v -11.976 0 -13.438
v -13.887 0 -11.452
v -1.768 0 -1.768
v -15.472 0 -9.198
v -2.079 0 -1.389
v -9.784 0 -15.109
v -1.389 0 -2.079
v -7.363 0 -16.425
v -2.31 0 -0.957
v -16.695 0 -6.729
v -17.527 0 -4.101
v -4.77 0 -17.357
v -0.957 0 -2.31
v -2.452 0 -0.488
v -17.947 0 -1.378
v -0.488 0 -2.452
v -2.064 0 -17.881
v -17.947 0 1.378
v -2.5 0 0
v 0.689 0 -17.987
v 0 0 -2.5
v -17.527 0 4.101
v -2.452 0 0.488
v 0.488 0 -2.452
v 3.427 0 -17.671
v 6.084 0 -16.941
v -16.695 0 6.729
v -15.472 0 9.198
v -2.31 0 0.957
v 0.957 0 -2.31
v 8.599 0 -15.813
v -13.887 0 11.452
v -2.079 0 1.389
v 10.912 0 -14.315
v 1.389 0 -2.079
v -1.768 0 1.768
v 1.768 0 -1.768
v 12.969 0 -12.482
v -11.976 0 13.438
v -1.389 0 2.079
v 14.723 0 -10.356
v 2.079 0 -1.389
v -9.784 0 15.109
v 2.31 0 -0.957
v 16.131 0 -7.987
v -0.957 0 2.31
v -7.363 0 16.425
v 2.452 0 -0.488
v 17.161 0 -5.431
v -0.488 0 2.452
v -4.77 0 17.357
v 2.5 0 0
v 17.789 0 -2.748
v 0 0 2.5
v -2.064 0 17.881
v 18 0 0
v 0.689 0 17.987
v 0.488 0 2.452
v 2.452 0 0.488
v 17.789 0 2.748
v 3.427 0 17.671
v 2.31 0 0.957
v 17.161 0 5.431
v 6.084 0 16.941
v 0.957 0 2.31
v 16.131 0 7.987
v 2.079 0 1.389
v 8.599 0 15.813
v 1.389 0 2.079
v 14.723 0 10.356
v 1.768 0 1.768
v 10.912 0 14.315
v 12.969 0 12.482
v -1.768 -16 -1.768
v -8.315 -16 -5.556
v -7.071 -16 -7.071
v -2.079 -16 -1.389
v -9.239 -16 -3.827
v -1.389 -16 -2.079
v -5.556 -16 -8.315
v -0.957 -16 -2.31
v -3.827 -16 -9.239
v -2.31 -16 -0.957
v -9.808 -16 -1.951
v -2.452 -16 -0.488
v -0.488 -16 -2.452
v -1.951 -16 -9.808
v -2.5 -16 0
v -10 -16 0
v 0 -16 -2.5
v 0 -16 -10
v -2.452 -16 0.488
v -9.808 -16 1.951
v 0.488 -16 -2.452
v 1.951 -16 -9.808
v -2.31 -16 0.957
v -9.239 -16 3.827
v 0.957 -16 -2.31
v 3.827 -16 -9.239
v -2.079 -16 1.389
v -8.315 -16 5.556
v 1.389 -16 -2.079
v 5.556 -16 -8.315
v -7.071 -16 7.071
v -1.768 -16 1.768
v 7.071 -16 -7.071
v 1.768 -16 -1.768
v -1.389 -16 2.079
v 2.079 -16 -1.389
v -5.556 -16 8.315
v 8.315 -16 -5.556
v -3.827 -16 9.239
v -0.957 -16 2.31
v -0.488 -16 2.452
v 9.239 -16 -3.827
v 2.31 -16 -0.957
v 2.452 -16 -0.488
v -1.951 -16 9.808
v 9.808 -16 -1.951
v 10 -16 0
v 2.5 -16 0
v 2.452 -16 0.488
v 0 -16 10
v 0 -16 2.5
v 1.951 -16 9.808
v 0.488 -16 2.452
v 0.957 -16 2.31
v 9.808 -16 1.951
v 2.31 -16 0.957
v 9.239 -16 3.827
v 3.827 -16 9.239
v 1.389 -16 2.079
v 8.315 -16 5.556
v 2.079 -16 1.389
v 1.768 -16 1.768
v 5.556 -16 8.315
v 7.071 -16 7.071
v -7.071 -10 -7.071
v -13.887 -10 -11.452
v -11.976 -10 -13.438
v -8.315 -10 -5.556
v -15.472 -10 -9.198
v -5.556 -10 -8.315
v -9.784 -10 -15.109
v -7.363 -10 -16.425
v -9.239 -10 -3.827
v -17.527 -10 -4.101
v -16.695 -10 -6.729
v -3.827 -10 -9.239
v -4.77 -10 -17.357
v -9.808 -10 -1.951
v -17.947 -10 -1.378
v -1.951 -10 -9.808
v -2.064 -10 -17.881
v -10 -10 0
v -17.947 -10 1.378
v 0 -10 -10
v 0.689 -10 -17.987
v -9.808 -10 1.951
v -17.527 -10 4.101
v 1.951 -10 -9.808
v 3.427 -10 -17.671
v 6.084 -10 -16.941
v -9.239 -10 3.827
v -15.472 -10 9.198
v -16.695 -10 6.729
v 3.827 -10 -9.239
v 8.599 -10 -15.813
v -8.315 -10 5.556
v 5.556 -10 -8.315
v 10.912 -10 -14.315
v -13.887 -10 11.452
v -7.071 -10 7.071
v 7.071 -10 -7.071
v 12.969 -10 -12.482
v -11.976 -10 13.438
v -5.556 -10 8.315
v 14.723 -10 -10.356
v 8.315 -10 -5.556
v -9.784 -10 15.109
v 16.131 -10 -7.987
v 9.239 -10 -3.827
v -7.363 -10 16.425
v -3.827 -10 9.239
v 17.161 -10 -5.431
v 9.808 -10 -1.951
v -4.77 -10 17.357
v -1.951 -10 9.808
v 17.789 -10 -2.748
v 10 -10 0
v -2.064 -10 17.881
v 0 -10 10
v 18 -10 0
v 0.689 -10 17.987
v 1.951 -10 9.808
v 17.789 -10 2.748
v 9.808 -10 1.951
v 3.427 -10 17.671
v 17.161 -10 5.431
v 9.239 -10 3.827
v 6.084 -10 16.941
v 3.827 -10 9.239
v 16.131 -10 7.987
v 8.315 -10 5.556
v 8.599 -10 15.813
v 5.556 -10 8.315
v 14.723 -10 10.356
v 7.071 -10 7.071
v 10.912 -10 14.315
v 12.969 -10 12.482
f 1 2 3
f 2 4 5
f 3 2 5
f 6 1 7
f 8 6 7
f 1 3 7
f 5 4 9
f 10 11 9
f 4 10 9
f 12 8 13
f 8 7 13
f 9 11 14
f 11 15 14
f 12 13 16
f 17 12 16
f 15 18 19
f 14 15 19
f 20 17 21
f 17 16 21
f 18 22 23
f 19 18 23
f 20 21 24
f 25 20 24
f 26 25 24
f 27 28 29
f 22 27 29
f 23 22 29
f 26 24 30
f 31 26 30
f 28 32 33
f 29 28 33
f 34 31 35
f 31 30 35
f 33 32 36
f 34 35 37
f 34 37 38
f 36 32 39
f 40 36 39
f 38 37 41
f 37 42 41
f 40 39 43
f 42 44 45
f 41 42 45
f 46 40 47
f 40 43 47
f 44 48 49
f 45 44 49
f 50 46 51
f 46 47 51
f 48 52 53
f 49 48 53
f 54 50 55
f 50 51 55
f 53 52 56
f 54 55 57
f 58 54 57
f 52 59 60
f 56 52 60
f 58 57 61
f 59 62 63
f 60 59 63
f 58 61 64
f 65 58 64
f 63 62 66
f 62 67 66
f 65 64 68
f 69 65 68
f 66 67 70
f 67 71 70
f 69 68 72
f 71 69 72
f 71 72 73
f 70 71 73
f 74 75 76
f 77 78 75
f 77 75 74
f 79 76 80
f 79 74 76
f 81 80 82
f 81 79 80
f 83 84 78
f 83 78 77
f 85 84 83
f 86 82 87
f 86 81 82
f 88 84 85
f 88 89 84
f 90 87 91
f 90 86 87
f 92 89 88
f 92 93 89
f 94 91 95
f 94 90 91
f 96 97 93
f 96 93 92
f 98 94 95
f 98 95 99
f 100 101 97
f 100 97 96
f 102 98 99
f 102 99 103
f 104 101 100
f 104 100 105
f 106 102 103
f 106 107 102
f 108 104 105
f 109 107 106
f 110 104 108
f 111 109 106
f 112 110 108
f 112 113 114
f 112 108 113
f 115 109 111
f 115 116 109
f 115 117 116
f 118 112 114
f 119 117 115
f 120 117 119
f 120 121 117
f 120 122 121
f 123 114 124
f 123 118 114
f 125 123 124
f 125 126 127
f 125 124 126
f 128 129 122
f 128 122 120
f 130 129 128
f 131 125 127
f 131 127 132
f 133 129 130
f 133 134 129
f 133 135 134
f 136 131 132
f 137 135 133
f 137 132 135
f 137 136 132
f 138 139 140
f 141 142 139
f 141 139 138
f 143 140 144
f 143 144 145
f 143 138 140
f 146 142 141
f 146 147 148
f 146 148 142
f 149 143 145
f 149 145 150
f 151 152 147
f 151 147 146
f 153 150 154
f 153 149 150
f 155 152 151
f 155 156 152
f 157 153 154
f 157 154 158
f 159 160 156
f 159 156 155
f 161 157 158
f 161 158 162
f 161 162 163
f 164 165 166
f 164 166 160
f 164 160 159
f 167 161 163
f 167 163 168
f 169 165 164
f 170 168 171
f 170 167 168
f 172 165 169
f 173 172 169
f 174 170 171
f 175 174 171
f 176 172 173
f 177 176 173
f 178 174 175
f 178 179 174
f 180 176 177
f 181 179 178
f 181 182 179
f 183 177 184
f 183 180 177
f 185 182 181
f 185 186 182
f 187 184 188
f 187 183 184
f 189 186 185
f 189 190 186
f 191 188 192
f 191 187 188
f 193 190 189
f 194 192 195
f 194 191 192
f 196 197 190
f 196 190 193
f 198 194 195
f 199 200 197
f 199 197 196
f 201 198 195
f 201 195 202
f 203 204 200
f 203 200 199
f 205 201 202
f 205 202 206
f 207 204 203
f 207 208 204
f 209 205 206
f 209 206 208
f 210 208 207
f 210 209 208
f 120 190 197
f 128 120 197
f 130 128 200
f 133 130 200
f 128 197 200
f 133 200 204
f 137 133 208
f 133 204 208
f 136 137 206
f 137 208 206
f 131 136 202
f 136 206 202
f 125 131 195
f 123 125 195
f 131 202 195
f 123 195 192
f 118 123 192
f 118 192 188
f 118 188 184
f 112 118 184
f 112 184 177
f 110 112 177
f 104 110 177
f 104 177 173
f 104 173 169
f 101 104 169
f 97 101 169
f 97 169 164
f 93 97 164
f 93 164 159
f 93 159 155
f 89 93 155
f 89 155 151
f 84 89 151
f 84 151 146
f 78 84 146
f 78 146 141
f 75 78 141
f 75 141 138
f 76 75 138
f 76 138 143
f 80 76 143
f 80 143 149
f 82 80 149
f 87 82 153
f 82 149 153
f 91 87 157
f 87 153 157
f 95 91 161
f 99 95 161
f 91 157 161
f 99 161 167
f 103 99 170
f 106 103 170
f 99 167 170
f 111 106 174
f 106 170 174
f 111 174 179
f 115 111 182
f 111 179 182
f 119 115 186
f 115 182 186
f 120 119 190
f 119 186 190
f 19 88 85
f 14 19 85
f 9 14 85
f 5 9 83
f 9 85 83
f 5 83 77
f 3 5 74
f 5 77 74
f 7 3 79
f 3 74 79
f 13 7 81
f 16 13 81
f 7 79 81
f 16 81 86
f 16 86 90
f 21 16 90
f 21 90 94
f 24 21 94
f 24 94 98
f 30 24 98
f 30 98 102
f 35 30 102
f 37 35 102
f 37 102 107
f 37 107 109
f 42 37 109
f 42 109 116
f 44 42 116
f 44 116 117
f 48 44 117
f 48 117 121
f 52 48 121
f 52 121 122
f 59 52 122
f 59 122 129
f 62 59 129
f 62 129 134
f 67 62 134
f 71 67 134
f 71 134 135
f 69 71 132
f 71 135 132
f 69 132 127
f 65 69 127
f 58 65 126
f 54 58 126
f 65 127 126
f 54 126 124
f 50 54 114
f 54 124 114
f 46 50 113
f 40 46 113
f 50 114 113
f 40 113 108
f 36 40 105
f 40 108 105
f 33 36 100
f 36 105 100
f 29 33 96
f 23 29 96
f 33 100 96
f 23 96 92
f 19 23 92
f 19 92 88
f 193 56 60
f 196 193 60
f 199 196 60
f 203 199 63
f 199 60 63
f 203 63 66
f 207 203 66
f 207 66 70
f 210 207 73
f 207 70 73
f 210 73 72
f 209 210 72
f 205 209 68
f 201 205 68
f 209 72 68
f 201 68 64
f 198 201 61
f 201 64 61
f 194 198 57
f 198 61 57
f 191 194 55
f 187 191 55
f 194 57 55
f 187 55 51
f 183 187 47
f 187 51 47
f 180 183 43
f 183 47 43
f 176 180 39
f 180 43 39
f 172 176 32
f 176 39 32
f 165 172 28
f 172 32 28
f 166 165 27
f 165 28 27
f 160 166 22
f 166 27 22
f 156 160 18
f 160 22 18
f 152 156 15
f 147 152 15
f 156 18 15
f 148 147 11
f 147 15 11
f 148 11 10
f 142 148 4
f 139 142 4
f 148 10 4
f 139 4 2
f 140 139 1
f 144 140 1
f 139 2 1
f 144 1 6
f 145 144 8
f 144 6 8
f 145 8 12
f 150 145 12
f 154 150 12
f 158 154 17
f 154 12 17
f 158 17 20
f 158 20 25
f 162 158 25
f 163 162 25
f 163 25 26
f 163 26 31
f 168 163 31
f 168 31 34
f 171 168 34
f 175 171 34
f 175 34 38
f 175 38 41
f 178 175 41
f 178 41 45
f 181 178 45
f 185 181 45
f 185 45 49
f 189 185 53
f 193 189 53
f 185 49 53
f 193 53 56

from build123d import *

# Parameters (mm, degrees)
F0_R     = 18
F0_R_2   = 10
F1_DEPTH = 10
F2_DEPTH = 16
F3_D     = 5


with BuildPart() as f1:
    # F0 (on Front) → F1 (new body)
    with BuildSketch(Plane.XZ):
        Circle(F0_R)
        Circle(F0_R_2, mode=Mode.SUBTRACT)
    extrude(amount=F1_DEPTH)

    # F0 (on Front) → F2 (join)
    with BuildSketch(Plane.XZ):
        Circle(F0_R_2)
    extrude(amount=F2_DEPTH)

    # F3 (through all)
    with Locations(Plane(origin=(0, 0, 0), x_dir=(1, 0, 0), z_dir=(0, 1, 0))):
        with Locations((0, 0)):
            Hole(F3_D / 2)


solid = f1.part
